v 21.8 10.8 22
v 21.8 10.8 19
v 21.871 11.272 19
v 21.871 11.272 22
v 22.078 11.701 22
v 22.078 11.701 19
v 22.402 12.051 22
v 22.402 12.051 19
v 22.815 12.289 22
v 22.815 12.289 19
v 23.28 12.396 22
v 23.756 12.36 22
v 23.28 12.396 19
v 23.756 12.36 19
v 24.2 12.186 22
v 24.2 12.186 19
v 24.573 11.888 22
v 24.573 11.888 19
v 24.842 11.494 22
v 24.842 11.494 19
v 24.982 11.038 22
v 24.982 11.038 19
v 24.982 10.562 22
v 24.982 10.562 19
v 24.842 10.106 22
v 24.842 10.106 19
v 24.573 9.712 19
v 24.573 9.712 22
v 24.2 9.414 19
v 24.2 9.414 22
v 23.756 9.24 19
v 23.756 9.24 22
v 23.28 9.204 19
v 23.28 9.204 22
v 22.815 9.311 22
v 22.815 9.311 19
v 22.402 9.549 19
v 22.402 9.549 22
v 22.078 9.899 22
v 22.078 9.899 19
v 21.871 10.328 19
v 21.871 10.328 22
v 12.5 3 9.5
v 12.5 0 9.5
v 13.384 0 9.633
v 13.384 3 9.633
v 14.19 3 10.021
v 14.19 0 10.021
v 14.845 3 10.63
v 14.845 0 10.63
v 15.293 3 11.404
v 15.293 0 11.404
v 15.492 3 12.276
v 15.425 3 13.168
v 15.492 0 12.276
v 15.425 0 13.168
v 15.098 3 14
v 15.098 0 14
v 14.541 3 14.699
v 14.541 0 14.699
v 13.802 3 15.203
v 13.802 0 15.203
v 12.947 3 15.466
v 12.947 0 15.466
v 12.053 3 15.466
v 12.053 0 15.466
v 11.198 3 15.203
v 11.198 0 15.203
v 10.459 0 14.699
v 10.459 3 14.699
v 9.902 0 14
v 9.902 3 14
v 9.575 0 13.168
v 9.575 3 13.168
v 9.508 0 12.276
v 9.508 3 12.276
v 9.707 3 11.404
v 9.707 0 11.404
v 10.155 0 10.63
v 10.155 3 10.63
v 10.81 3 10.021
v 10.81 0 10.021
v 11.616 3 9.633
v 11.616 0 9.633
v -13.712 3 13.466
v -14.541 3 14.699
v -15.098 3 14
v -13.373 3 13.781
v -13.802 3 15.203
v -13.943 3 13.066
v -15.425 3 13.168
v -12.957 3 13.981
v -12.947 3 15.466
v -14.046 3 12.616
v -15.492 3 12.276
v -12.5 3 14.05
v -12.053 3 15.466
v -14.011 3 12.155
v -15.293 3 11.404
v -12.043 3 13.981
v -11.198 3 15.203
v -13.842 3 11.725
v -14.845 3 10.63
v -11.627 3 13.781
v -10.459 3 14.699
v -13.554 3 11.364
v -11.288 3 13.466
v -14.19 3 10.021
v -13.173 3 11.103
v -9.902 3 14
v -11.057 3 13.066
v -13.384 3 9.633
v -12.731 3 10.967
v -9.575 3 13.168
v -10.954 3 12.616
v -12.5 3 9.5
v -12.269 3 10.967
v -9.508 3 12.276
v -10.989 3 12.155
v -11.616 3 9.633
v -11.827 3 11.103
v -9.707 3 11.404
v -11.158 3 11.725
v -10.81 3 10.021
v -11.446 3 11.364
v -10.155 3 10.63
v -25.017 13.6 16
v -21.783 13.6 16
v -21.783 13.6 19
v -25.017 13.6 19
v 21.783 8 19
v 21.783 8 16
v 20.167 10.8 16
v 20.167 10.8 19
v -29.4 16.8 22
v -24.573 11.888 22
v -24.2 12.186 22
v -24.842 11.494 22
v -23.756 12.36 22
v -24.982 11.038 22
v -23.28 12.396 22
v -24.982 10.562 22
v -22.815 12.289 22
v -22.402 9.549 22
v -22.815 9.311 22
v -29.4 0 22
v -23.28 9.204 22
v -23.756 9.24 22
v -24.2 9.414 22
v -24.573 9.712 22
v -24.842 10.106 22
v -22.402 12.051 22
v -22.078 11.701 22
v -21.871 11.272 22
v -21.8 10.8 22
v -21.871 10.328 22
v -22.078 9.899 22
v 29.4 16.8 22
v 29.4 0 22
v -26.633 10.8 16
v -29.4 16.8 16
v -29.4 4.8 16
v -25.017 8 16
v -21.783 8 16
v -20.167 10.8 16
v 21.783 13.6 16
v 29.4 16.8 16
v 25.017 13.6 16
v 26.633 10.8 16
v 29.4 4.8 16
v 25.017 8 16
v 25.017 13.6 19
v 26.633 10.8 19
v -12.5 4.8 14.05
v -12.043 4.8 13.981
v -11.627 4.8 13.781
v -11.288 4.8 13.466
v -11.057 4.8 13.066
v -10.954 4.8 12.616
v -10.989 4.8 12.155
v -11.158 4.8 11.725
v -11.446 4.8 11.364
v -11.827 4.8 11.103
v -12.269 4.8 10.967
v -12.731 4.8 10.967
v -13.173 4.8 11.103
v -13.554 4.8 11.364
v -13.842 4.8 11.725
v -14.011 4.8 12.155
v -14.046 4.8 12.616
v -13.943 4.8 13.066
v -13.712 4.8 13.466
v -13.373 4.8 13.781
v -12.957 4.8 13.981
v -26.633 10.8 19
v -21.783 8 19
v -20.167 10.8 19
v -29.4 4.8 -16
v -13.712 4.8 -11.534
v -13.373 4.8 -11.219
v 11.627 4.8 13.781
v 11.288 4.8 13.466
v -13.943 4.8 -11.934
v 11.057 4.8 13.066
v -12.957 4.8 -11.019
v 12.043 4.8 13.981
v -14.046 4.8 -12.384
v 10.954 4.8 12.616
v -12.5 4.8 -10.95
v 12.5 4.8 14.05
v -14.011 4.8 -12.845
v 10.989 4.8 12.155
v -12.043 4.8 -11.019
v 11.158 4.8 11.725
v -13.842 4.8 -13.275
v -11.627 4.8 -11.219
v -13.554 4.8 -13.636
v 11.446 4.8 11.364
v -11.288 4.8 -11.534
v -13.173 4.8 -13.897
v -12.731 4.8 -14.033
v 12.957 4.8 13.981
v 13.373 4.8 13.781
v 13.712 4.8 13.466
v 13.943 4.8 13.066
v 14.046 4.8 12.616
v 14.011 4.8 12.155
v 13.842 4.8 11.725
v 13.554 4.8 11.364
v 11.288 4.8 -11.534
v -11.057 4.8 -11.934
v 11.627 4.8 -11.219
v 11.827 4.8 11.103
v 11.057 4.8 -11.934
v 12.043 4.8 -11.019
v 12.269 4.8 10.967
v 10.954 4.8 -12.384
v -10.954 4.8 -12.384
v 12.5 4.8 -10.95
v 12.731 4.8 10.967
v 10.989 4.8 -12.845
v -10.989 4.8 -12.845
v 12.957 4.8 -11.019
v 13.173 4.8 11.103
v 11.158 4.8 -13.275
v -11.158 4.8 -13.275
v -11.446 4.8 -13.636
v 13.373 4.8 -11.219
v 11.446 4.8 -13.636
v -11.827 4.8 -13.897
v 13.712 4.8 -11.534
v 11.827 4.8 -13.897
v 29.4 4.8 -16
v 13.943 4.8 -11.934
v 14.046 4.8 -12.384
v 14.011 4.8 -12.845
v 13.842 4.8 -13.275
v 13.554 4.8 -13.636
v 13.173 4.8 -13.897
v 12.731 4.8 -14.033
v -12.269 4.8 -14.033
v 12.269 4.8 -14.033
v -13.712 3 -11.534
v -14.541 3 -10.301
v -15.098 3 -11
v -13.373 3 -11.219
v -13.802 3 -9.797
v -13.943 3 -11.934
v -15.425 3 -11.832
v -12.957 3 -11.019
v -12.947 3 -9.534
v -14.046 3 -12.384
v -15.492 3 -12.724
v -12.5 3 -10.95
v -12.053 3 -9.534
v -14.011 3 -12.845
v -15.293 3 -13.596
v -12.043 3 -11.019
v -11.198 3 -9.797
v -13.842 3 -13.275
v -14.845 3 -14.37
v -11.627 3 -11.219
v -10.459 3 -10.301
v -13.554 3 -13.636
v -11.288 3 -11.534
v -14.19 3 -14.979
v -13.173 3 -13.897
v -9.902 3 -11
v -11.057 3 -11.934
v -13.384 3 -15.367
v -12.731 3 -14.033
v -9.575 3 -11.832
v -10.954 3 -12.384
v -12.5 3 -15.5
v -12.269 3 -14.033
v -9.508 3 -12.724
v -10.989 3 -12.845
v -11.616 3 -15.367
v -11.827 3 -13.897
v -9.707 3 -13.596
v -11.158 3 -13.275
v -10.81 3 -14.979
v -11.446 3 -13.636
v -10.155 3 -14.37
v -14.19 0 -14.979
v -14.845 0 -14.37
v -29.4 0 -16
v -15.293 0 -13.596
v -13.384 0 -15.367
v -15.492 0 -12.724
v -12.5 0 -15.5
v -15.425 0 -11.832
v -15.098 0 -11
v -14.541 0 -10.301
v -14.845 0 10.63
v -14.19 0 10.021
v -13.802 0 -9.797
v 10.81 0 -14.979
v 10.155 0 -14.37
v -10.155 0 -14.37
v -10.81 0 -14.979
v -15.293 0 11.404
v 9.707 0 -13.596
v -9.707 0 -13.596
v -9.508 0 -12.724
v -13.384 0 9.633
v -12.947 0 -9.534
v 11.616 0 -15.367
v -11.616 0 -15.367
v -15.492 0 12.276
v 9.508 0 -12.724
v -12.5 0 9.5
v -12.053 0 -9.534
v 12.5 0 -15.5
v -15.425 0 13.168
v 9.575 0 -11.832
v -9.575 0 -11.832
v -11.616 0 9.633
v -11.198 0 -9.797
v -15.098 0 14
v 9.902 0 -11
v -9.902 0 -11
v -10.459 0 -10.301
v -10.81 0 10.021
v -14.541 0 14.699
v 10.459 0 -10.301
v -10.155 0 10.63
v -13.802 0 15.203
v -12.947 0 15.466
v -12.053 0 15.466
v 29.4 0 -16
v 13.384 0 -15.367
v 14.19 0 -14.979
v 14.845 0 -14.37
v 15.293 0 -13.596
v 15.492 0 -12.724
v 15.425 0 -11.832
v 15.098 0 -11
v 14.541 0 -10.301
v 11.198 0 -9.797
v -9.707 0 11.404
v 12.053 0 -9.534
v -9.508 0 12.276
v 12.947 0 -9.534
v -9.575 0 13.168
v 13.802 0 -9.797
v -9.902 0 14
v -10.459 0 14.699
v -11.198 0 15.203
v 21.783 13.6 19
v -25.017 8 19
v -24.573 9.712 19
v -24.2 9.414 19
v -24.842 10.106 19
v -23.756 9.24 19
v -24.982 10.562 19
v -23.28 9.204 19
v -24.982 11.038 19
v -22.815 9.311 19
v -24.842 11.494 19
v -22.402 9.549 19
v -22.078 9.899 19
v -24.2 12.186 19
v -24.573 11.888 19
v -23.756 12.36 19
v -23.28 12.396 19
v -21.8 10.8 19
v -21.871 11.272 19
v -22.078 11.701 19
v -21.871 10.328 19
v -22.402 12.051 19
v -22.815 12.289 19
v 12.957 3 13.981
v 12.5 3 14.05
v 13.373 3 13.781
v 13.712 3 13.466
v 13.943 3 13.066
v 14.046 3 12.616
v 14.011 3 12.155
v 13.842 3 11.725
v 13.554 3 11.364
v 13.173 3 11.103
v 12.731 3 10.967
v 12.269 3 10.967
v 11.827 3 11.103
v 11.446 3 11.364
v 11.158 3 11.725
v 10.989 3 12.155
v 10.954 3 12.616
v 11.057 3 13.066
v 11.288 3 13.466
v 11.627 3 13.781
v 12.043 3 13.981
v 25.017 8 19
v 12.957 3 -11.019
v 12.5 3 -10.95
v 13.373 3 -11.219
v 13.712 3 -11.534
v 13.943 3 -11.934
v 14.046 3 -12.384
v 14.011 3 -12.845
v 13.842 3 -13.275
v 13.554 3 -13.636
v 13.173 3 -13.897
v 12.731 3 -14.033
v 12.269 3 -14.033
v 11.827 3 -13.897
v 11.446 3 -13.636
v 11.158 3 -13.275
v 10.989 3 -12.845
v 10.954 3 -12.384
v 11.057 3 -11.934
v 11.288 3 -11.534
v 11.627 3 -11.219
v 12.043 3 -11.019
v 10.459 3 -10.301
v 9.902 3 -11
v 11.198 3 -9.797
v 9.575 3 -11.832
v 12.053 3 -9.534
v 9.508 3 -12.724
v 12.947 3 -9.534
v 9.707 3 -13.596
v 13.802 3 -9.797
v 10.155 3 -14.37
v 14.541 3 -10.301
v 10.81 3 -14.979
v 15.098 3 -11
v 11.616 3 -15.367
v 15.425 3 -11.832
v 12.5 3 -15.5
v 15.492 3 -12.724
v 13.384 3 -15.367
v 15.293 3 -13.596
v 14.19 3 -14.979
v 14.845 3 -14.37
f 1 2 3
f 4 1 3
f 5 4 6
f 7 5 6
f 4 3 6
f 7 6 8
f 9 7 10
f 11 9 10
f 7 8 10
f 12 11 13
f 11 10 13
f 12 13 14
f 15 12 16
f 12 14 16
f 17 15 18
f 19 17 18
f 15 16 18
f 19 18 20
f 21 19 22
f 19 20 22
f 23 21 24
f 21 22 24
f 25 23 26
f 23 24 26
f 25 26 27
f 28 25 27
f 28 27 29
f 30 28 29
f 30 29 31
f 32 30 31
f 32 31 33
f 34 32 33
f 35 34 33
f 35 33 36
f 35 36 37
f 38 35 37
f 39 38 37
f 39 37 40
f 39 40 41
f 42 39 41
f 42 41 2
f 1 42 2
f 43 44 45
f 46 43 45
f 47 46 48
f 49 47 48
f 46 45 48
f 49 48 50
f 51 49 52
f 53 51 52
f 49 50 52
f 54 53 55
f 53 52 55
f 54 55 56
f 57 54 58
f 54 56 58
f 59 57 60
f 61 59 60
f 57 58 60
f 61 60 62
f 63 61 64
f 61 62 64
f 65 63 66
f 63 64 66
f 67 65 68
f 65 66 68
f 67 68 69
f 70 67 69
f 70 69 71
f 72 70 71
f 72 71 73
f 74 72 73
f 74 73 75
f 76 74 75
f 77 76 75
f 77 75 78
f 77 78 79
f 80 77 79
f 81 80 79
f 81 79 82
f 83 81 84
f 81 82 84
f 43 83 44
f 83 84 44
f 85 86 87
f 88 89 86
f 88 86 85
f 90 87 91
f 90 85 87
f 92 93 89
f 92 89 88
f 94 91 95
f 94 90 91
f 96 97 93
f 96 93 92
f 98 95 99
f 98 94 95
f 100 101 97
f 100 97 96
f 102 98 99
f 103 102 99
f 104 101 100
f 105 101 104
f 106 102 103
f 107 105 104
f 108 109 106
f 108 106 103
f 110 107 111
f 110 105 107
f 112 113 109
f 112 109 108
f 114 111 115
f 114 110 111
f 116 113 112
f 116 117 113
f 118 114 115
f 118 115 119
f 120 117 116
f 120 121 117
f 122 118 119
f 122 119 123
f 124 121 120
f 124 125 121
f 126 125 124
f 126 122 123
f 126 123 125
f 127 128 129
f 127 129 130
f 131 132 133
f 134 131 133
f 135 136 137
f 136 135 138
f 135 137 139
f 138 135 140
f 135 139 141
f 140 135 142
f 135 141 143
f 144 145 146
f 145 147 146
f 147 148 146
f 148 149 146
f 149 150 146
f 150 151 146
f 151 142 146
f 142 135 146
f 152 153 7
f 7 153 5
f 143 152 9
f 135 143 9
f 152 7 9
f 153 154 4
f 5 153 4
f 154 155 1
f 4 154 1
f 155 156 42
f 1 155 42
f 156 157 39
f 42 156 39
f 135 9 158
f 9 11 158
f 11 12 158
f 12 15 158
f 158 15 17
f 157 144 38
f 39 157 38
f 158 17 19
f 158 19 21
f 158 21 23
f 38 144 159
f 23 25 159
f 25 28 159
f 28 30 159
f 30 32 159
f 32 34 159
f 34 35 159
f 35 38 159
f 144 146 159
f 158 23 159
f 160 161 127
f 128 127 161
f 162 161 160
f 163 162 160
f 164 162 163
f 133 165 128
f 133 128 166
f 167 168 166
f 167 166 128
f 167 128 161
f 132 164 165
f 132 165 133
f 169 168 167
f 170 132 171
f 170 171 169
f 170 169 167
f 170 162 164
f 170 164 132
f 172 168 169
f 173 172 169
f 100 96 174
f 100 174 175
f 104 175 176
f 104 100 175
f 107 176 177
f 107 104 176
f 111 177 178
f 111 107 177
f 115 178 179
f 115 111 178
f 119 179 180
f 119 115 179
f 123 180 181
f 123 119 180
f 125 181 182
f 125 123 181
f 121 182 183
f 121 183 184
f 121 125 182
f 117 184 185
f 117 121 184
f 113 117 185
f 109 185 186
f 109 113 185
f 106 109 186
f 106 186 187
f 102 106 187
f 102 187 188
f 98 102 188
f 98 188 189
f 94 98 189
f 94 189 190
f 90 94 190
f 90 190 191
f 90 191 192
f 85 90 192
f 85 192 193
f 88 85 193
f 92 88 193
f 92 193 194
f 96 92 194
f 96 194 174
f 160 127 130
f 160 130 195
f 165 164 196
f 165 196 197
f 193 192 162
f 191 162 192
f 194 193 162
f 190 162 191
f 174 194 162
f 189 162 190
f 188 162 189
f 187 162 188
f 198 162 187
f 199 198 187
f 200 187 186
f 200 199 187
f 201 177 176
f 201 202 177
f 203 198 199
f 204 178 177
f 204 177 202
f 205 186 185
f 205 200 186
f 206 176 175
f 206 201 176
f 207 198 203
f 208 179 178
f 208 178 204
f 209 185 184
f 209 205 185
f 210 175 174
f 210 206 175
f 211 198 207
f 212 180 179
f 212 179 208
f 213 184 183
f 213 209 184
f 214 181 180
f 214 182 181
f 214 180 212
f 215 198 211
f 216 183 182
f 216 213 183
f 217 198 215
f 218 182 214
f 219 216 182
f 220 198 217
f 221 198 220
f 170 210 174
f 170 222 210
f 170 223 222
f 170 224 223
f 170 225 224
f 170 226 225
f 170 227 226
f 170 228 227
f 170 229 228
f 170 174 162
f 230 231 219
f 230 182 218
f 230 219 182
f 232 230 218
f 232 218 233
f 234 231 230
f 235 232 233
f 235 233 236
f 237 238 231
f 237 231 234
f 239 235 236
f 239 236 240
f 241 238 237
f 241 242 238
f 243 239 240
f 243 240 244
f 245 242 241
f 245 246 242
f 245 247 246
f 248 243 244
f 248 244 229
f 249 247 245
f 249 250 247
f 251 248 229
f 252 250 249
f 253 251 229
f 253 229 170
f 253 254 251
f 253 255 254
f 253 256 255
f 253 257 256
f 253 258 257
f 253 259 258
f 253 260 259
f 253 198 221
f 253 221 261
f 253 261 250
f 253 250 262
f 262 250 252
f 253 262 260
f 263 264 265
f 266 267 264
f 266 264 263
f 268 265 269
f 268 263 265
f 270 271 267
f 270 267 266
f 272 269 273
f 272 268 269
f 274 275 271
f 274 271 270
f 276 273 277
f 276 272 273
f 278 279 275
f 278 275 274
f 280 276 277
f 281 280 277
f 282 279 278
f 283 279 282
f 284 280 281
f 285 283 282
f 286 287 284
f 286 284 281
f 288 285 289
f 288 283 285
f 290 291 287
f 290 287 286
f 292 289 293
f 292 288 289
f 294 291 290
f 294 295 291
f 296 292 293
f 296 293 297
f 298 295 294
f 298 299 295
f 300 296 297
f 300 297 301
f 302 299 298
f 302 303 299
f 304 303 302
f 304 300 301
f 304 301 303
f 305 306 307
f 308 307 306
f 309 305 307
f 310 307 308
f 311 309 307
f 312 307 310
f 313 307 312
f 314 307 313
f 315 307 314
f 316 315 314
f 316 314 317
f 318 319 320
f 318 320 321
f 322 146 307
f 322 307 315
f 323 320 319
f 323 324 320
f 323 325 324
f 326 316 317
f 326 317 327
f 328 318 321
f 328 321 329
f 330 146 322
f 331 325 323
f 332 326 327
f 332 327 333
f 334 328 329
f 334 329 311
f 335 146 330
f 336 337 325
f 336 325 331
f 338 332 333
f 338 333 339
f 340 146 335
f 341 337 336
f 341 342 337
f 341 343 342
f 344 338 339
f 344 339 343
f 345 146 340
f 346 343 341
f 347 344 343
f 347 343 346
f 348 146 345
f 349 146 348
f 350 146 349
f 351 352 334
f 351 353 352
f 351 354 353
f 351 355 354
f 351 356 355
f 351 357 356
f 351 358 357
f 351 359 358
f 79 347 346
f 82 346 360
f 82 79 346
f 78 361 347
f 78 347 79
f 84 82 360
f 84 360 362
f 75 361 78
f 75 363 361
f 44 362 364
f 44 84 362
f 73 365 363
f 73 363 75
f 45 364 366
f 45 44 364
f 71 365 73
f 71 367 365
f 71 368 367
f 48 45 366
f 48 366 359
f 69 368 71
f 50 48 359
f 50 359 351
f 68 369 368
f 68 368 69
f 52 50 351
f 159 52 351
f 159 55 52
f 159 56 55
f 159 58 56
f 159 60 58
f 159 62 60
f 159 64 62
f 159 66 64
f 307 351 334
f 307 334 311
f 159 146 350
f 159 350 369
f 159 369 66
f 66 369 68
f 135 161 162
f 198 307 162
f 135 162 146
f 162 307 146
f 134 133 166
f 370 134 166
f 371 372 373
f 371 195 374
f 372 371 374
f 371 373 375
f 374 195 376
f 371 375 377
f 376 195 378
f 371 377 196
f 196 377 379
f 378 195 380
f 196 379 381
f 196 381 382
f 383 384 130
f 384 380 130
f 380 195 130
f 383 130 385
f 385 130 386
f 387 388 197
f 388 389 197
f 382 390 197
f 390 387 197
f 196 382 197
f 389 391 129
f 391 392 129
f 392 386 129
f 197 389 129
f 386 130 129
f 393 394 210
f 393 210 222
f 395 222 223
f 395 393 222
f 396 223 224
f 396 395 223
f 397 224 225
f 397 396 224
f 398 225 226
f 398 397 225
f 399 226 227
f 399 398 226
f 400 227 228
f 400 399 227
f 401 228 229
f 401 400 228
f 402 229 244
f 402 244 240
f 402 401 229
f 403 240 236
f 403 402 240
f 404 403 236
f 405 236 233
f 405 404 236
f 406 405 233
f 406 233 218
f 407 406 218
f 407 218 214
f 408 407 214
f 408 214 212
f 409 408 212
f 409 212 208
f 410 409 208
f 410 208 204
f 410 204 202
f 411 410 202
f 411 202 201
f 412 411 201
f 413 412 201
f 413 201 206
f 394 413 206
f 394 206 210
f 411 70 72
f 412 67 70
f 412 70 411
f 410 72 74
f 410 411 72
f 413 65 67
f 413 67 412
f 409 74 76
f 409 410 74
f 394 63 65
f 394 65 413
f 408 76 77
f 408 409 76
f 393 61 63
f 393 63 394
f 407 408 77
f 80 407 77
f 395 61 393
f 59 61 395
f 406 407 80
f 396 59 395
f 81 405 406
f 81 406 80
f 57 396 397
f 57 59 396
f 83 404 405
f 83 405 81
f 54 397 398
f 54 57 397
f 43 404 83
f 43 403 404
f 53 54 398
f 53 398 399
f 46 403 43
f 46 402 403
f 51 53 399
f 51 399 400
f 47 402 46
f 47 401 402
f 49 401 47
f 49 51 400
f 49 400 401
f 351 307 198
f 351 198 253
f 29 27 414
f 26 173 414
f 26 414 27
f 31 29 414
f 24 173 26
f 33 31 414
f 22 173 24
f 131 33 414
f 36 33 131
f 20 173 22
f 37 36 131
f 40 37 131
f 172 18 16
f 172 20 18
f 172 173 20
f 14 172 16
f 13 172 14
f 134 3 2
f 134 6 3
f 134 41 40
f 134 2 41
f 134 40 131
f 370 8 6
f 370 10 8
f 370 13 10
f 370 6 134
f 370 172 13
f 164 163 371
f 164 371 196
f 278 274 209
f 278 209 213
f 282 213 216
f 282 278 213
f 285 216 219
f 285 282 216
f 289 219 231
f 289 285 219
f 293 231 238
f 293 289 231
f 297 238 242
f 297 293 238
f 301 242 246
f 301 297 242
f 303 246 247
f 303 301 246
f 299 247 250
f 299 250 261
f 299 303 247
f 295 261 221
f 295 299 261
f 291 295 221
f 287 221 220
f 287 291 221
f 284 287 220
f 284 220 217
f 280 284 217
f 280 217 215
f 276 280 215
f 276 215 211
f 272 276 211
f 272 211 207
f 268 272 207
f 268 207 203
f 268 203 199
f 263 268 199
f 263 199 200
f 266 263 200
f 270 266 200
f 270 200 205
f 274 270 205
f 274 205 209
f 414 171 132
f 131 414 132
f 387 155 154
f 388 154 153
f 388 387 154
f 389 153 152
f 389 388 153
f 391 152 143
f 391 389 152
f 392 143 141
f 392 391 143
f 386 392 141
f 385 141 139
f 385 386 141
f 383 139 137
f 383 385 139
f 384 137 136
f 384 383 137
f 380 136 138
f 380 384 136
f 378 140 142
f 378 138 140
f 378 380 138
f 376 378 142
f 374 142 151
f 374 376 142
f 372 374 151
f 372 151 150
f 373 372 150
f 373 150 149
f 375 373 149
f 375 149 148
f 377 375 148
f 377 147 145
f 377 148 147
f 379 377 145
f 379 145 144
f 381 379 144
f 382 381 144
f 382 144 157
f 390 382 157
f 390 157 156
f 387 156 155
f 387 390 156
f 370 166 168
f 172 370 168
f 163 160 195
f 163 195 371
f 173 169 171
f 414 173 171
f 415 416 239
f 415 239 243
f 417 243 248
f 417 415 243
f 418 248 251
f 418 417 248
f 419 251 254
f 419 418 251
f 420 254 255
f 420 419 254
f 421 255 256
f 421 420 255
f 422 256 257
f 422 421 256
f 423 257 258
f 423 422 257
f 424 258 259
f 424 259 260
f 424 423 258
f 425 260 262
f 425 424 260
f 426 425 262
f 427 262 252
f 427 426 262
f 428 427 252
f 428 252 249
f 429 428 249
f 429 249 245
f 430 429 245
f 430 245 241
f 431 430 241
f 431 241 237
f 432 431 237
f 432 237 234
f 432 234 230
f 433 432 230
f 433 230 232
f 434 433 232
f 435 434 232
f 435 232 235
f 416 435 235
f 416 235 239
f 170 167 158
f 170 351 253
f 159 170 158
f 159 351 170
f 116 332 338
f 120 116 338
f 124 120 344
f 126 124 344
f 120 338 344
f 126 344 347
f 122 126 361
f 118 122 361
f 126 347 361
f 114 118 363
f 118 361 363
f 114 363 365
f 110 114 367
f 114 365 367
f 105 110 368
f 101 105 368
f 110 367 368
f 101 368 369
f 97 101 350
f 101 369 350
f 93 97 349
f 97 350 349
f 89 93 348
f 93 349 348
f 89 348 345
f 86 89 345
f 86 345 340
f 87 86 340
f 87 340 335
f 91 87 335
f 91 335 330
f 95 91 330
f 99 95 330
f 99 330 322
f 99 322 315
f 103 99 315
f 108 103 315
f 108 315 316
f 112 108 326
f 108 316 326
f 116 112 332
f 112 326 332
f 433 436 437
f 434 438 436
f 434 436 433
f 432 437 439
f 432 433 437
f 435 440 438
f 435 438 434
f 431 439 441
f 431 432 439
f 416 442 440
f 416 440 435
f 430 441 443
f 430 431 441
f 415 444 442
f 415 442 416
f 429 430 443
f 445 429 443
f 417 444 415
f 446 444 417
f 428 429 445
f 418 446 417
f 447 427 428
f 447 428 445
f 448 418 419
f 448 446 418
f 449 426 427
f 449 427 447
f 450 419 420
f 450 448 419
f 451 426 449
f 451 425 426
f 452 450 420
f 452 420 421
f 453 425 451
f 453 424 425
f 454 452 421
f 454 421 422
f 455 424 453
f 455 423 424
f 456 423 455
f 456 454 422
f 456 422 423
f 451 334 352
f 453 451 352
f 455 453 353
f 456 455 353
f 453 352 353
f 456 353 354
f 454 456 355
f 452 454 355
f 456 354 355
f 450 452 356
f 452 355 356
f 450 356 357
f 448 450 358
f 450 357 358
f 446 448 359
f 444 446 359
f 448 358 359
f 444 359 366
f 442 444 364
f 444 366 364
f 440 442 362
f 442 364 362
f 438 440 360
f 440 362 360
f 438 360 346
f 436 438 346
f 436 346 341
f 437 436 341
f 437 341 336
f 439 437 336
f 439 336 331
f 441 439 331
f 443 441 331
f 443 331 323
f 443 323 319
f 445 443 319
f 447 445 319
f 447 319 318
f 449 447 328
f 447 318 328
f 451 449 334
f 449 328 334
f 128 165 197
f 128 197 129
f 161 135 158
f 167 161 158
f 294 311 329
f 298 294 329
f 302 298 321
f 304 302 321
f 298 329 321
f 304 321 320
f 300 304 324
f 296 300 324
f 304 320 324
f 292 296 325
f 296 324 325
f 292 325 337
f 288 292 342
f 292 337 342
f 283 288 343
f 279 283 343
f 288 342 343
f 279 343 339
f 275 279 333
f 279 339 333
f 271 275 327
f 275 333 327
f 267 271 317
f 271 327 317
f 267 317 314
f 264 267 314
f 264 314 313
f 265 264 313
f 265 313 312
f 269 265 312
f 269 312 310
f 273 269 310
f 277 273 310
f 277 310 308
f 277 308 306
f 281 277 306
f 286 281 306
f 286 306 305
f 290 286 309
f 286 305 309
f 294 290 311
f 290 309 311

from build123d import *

# Parameters (mm, degrees)
SKETCH1_W           = 58.8
SKETCH1_H           = 32
SKETCH1_R           = 1.55
BOSS_EXTRUDE1_DEPTH = 4.8
SKETCH2_R           = 3
CUT_EXTRUDE1_DEPTH  = 3
SKETCH3_W           = 58.8
SKETCH3_H           = 6
BOSS_EXTRUDE2_DEPTH = 16.8
CUT_EXTRUDE2_DEPTH  = 3
SKETCH5_R           = 1.6
CUT_EXTRUDE3_DEPTH  = 49.699075967


with BuildPart() as part:
    # Sketch1 → Boss-Extrude1 (new body)
    with BuildSketch(Plane(origin=(0, 0, 0), x_dir=(1, 0, 0), z_dir=(0, 1, 0))):
        Rectangle(SKETCH1_W, SKETCH1_H)
        with Locations(Location((-12.5, 12.5, 0), (0, 0, 270))):
            Circle(SKETCH1_R, mode=Mode.SUBTRACT)
        with Locations(Location((12.5, 12.5, 0), (0, 0, 270))):
            Circle(SKETCH1_R, mode=Mode.SUBTRACT)
        with Locations(Location((12.5, -12.5, 0), (0, 0, 270))):
            Circle(SKETCH1_R, mode=Mode.SUBTRACT)
        with Locations(Location((-12.5, -12.5, 0), (0, 0, 270))):
            Circle(SKETCH1_R, mode=Mode.SUBTRACT)
    extrude(amount=BOSS_EXTRUDE1_DEPTH)

    # Sketch2 → Cut-Extrude1 (cut)
    with BuildSketch(Plane.XZ):
        with Locations(Location((-12.5, 12.5, 0), (0, 0, 270))):
            Circle(SKETCH2_R)
        with Locations(Location((12.5, 12.5, 0), (0, 0, 270))):
            Circle(SKETCH2_R)
        with Locations(Location((12.5, -12.5, 0), (0, 0, 270))):
            Circle(SKETCH2_R)
        with Locations(Location((-12.5, -12.5, 0), (0, 0, 270))):
            Circle(SKETCH2_R)
    extrude(amount=-CUT_EXTRUDE1_DEPTH, mode=Mode.SUBTRACT)

    # Sketch3 → Boss-Extrude2 (add)
    with BuildSketch(Plane.XZ):
        with Locations((0, 19)):
            Rectangle(SKETCH3_W, SKETCH3_H)
    extrude(amount=-BOSS_EXTRUDE2_DEPTH)

    # Sketch4 → Cut-Extrude2 (cut)
    with BuildSketch(Plane(origin=(0, 0, 16), x_dir=(-1, 0, 0), z_dir=(0, 0, -1))):
        Polygon((-20.166838493, 10.8), (-21.783419246, 13.6), (-25.016580754, 13.6), (-26.633161507, 10.8), (-25.016580754, 8), (-21.783419246, 8), align=None)
    cut_extrude2 = extrude(amount=-CUT_EXTRUDE2_DEPTH, mode=Mode.SUBTRACT)

    # Sketch5 → Cut-Extrude3 (cut, through all)
    with BuildSketch(Plane(origin=(0, 0, 19), x_dir=(-1, 0, 0), z_dir=(0, 0, -1))):
        with Locations((-23.4, 10.8)):
            Circle(SKETCH5_R)
    cut_extrude3 = extrude(amount=-CUT_EXTRUDE3_DEPTH, mode=Mode.SUBTRACT)

    # Mirror1: Cut-Extrude2, Cut-Extrude3 across plane
    add(cut_extrude2.mirror(Plane(origin=(0, 0, 0), x_dir=(0, 0, 1), z_dir=(1, 0, 0))), mode=Mode.SUBTRACT)
    add(cut_extrude3.mirror(Plane(origin=(0, 0, 0), x_dir=(0, 0, 1), z_dir=(1, 0, 0))), mode=Mode.SUBTRACT)


solid = part.part
